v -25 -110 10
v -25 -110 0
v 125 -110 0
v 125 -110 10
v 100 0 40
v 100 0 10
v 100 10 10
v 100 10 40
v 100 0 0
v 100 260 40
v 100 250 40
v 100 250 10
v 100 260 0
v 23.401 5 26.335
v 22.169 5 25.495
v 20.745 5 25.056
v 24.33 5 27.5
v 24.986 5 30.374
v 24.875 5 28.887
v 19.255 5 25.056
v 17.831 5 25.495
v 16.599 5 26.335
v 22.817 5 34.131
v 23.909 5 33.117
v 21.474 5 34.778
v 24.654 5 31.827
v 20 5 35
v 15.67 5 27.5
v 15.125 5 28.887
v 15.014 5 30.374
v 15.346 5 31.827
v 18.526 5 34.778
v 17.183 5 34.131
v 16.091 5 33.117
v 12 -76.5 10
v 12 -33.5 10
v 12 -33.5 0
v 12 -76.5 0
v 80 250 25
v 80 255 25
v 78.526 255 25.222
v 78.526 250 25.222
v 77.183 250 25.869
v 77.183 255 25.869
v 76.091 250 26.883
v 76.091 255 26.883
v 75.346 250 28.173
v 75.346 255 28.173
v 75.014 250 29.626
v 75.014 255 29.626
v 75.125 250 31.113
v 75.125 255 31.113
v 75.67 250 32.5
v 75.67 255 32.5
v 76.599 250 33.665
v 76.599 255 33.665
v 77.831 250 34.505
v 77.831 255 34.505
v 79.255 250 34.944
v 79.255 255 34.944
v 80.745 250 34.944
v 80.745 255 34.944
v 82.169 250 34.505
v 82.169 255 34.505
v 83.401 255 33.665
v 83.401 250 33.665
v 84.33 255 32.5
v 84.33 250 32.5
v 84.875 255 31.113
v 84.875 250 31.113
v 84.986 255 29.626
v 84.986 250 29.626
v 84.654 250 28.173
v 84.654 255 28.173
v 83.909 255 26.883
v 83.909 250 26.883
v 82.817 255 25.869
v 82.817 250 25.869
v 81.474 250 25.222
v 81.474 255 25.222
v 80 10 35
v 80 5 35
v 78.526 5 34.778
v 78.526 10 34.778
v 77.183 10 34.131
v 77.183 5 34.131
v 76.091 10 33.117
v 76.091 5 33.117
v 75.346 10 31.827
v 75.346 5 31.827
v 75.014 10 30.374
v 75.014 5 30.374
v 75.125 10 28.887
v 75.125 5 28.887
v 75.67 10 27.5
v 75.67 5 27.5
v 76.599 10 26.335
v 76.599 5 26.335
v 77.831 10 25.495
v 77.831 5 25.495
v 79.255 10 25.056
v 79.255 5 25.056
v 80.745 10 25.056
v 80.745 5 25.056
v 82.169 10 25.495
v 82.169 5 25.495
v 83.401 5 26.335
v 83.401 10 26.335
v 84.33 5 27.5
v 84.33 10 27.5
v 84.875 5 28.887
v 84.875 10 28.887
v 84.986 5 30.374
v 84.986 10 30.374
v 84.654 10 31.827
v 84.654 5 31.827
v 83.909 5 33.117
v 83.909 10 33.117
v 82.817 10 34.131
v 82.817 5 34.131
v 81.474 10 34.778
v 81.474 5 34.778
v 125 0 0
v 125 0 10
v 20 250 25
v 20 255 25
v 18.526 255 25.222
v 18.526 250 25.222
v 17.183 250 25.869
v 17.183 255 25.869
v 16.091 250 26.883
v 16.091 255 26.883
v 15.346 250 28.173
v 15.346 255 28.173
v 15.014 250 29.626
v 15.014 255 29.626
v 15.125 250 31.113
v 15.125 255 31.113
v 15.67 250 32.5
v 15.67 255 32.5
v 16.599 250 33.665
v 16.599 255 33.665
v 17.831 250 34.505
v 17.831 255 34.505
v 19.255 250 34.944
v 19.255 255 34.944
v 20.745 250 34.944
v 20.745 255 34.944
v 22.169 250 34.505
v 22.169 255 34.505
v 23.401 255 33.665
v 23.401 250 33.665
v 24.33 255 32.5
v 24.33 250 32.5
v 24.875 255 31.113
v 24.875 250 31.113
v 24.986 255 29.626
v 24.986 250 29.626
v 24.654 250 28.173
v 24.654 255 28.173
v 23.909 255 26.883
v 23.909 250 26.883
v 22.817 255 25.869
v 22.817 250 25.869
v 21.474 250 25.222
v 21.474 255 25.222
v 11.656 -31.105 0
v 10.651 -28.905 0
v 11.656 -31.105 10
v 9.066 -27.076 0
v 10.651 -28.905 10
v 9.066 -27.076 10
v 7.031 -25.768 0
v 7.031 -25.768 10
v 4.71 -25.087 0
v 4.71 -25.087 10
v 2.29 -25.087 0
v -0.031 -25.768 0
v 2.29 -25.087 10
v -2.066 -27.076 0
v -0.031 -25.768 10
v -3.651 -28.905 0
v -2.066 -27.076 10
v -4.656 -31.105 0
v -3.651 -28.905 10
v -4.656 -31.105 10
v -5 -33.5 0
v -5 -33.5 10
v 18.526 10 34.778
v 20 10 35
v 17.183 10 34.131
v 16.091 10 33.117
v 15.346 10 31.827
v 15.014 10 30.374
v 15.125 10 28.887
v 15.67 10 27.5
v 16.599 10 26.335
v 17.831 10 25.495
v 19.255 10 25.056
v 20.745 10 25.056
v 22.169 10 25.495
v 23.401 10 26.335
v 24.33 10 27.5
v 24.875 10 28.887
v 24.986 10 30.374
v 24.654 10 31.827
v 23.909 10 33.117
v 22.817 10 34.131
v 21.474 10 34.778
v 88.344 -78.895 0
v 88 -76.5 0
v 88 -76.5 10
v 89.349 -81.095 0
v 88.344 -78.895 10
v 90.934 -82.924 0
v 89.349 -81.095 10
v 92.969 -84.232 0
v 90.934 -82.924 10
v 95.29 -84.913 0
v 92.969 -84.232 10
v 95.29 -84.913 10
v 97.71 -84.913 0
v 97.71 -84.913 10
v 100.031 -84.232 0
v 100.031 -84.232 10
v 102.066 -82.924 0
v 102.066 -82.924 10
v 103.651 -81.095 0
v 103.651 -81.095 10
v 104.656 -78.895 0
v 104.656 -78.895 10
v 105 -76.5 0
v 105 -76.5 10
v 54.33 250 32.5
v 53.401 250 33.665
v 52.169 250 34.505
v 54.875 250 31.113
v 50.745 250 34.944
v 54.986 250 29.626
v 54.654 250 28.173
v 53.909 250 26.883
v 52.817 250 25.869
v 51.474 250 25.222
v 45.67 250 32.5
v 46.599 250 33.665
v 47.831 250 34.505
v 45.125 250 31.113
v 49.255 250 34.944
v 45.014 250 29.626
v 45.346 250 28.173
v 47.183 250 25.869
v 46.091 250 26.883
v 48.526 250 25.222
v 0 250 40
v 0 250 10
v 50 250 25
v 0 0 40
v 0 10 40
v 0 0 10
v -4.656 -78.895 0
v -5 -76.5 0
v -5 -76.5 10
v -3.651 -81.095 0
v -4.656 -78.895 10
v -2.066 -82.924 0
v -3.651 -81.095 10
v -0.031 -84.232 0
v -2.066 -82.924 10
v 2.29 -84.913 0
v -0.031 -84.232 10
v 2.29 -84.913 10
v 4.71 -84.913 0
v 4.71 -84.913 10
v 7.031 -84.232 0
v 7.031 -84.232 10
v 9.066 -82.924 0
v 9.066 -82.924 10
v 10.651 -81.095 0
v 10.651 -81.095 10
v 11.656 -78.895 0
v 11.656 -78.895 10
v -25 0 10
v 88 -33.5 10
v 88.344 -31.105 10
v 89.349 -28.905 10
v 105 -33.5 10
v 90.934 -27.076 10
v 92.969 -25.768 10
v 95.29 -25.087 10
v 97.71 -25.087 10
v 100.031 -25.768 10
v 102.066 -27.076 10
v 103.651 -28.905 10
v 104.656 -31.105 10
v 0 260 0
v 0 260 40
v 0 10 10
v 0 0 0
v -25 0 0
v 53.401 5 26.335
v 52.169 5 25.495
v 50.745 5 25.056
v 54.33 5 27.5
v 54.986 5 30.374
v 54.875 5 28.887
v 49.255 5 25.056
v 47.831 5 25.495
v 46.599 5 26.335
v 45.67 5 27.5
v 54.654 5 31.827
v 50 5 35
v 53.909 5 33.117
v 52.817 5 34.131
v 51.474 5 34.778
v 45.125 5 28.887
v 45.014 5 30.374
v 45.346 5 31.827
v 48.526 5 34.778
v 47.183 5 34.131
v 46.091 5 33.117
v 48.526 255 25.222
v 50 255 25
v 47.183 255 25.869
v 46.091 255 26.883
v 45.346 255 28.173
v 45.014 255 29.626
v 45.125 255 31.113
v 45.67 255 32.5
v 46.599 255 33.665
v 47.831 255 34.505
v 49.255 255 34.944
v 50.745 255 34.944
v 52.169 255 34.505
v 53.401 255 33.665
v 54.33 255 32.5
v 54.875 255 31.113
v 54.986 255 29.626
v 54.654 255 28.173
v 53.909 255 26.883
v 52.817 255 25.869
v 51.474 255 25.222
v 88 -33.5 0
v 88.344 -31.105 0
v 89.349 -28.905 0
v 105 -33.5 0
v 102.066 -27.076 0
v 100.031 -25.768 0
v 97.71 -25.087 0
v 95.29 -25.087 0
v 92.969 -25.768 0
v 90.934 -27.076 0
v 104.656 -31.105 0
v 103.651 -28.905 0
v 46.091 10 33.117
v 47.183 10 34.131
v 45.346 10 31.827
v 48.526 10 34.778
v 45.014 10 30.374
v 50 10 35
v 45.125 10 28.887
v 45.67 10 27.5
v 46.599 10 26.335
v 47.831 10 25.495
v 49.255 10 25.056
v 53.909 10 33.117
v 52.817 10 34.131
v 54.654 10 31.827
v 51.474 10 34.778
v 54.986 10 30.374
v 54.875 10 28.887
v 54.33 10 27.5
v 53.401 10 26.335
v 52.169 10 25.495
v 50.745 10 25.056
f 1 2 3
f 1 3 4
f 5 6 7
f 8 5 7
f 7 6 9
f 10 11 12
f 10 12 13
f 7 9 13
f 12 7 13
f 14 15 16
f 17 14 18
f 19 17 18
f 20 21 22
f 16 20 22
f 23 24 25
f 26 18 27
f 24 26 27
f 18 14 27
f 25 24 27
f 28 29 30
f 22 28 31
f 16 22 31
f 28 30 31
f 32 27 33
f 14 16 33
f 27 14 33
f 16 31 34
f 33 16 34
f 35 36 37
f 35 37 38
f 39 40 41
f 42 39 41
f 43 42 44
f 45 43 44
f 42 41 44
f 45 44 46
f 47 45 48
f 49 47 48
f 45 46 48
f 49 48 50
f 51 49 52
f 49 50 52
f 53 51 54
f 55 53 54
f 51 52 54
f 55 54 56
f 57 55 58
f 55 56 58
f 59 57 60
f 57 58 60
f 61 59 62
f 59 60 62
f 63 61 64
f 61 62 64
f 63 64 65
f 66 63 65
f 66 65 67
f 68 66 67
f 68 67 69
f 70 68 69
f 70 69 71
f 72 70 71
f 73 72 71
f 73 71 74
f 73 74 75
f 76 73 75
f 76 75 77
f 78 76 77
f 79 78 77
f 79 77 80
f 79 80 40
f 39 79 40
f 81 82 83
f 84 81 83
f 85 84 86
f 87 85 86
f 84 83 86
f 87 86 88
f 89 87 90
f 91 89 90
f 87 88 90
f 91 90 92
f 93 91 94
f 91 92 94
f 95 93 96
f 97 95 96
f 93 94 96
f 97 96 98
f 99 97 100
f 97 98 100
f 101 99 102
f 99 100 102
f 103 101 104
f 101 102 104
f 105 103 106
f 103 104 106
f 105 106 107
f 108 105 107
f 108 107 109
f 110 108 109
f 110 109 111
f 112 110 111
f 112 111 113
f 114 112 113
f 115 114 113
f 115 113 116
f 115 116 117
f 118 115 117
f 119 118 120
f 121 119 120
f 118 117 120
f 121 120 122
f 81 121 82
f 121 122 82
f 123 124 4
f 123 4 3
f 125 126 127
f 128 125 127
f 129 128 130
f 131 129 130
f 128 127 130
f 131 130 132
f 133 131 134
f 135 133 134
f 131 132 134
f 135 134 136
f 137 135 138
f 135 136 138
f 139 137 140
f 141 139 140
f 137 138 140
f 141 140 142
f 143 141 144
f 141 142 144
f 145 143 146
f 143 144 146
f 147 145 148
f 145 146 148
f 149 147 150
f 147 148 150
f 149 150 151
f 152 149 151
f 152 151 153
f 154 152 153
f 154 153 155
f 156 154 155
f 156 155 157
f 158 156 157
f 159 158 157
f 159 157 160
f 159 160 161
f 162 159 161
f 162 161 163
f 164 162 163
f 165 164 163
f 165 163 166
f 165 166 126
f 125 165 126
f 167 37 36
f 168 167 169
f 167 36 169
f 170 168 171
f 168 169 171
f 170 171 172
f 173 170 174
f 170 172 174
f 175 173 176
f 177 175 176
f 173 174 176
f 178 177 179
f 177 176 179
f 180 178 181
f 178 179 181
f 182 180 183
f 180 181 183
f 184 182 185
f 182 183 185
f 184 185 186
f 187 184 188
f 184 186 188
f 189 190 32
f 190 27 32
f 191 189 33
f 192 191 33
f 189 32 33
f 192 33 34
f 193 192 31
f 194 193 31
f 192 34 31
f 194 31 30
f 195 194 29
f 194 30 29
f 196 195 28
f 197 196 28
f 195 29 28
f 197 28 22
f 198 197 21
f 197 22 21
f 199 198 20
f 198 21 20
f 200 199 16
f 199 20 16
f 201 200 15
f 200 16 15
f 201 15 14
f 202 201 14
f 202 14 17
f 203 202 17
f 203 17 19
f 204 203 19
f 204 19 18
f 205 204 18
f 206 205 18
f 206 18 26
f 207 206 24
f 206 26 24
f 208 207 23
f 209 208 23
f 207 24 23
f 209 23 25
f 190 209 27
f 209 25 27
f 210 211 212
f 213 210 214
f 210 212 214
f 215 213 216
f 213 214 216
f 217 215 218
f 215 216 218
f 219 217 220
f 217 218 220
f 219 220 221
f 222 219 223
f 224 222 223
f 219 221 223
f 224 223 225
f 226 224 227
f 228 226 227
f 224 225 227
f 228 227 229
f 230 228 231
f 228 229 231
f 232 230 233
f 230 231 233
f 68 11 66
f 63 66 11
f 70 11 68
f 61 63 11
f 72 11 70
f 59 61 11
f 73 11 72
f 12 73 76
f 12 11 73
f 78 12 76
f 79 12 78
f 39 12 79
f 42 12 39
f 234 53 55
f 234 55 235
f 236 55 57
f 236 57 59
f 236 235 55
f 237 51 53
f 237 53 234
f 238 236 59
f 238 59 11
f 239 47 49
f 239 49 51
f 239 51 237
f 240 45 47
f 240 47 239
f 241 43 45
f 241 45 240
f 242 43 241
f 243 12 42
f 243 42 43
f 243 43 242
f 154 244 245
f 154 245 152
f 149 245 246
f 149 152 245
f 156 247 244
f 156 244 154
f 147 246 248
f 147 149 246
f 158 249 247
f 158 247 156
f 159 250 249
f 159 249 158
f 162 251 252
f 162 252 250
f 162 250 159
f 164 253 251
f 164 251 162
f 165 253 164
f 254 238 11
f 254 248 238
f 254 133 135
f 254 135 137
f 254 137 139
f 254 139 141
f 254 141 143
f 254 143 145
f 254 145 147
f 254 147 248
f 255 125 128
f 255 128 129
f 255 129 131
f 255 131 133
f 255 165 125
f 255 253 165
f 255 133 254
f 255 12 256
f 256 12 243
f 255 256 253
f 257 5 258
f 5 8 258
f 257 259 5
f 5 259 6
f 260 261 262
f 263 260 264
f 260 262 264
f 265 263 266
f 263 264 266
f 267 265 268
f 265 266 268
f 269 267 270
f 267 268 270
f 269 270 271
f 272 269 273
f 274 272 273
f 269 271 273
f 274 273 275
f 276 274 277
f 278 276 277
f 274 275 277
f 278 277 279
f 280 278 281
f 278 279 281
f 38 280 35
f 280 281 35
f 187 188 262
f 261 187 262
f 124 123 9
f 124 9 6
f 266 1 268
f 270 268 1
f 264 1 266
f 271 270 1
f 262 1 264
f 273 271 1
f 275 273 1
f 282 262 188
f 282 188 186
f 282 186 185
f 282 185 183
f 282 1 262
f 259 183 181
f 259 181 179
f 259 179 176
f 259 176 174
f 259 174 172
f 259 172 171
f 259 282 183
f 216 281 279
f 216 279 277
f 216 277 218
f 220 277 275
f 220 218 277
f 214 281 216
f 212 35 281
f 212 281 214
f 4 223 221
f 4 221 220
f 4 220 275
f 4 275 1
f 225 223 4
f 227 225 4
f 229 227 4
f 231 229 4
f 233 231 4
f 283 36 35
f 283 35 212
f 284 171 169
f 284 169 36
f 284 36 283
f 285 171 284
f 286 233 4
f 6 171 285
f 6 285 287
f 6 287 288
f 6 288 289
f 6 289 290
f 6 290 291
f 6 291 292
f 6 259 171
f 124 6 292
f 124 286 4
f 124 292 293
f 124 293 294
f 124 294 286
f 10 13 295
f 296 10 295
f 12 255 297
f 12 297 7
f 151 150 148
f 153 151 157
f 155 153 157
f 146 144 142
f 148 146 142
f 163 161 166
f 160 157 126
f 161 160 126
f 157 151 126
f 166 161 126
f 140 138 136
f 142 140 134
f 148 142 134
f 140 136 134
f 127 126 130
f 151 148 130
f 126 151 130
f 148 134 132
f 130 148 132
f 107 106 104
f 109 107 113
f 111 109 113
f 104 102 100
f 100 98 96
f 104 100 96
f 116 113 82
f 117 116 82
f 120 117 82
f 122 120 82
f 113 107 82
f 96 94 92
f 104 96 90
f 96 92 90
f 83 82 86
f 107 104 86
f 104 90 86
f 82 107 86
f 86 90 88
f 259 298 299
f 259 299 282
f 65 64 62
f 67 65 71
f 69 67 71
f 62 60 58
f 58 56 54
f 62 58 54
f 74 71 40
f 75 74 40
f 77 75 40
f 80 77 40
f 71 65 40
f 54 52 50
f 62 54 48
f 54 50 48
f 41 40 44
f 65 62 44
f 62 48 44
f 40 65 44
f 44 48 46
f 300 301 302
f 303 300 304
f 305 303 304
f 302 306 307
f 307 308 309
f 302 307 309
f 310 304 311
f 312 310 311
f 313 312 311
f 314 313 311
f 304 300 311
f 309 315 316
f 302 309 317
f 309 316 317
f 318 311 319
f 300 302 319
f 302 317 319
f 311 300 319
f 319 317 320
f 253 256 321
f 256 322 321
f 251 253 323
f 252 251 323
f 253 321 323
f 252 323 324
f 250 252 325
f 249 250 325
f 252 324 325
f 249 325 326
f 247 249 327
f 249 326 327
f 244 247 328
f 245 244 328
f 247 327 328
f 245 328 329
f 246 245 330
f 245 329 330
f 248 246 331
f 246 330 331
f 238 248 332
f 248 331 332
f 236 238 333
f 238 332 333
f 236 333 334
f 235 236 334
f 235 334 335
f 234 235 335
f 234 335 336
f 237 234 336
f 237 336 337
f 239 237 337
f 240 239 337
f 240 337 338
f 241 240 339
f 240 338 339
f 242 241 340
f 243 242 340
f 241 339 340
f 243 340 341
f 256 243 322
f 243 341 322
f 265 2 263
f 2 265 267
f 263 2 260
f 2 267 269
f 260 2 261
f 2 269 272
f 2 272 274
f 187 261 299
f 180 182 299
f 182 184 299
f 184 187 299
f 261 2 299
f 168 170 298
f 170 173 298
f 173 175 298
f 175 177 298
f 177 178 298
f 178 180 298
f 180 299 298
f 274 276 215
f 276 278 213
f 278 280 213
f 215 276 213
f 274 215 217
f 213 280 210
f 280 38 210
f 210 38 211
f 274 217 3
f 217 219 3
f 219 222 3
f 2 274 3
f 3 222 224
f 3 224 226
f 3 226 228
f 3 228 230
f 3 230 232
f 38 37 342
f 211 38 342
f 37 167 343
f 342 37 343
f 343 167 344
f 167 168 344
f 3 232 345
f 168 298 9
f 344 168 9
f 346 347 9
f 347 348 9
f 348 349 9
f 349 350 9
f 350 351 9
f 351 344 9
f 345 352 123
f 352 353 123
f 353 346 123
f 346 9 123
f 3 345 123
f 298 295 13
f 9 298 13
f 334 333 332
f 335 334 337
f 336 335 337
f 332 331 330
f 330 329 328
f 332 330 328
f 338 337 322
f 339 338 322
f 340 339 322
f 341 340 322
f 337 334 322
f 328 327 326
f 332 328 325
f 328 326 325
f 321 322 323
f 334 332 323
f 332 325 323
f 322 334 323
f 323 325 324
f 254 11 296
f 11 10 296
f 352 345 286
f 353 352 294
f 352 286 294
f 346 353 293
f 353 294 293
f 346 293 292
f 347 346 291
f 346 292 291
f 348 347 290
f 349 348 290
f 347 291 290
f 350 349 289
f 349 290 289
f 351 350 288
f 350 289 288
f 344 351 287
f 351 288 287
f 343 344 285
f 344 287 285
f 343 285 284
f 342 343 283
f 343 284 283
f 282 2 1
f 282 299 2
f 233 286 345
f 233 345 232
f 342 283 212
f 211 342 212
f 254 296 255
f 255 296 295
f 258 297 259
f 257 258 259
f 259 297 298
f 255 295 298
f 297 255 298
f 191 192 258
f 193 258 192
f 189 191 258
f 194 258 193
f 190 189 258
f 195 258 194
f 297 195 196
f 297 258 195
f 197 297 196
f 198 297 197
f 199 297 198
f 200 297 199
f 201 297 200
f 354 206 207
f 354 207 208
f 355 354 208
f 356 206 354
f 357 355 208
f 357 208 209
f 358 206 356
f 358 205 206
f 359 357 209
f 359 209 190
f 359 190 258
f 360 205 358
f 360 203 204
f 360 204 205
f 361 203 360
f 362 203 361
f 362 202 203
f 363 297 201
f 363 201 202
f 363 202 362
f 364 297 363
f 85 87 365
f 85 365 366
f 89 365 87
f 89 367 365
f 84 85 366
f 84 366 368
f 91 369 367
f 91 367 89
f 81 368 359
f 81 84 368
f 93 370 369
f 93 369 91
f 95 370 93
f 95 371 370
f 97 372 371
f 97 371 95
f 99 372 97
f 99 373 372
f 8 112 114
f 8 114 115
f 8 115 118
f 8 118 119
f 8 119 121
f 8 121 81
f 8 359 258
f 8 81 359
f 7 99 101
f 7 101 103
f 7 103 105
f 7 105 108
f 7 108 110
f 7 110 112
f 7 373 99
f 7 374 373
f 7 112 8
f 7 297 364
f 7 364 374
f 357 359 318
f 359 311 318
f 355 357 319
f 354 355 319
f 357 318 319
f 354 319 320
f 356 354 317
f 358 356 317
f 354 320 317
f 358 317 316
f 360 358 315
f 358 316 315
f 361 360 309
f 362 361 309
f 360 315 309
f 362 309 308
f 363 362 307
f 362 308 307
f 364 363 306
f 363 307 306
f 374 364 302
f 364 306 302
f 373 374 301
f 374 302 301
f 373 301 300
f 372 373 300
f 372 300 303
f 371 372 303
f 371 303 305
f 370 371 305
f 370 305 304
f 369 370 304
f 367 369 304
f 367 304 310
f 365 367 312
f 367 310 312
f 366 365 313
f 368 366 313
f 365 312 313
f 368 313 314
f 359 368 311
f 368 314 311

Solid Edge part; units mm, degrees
sketch "Sketch1" plane through (0, 0, 0) normal (0, 0, 1) x (1, 0, 0)
  line L0 (100, 0) -> (100, 260)
  line L1 (100, 260) -> (0, 260)
  line L2 (0, 260) -> (0, 0)
  line L3 (0, 0) -> (100, 0)
extrude "Protrusion1" add sketch "Sketch1" along normal blind 10
sketch "Sketch2" plane through (50, 130, 10) normal (0, 0, 1) x (1, 0, 0)
  line L0 (-50, 130) -> (50, 130)
  line L1 (50, 130) -> (50, 120)
  line L2 (50, 120) -> (-50, 120)
  line L3 (-50, 120) -> (-50, 130)
  line L4 (-50, -120) -> (50, -120)
  line L5 (50, -120) -> (50, -130)
  line L6 (50, -130) -> (-50, -130)
  line L7 (-50, -130) -> (-50, -120)
  dimension "D1" = 10
  dimension "D2" = 10
extrude "ExtrudedCutout_1" add sketch "Sketch2" along normal blind 30
hole "Hole_1" at (20, 250, 30) direction (0, 1, 0) diameter 10 depth 5
hole "Hole1" at (50, 250, 30) direction (0, 1, 0) diameter 10 depth 5
hole "Hole2" at (80, 250, 30) direction (0, 1, 0) diameter 10 depth 5
hole "Hole_4" at (80, 10, 30) direction (0, -1, 0) diameter 10 depth 5
hole "Hole3" at (50, 10, 30) direction (0, -1, 0) diameter 10 depth 5
hole "Hole4" at (20, 10, 30) direction (0, -1, 0) diameter 10 depth 5
sketch "Sketch3" plane through (50, 0, 15) normal (0, -1, 0) x (0, 0, 1)
  line L0 (-5, -75) -> (-15, -75)
  line L1 (-15, -75) -> (-15, 75)
  line L2 (-15, 75) -> (-5, 75)
  line L3 (-5, 75) -> (-5, -75)
extrude "ExtrudedProtrusion_5" add sketch "Sketch3" along normal blind 110
sketch "Sketch4" plane through (50, -55, 10) normal (0, 0, 1) x (-1, 0, 0)
  arc A0 (-55, 21.5) -> (-38, 21.5) centre (-46.5, 21.5) cw
  line L0 (-55, -21.5) -> (-55, 21.5)
  arc A1 (-38, -21.5) -> (-55, -21.5) centre (-46.5, -21.5) cw
  line L1 (-38, -21.5) -> (-38, 21.5)
  arc A2 (38, 21.5) -> (55, 21.5) centre (46.5, 21.5) cw
  line L2 (38, -21.5) -> (38, 21.5)
  arc A3 (55, -21.5) -> (38, -21.5) centre (46.5, -21.5) cw
  line L3 (55, -21.5) -> (55, 21.5)
  dimension "D1" = 17
  dimension "D2" = 17
  dimension "D3" = 110
  dimension "D4" = 60
  dimension "D5" = 25
  dimension "D6" = 25
  dimension "D7" = 20
  dimension "D8" = 20
extrude "Cutout1" cut sketch "Sketch4" against normal up to next
